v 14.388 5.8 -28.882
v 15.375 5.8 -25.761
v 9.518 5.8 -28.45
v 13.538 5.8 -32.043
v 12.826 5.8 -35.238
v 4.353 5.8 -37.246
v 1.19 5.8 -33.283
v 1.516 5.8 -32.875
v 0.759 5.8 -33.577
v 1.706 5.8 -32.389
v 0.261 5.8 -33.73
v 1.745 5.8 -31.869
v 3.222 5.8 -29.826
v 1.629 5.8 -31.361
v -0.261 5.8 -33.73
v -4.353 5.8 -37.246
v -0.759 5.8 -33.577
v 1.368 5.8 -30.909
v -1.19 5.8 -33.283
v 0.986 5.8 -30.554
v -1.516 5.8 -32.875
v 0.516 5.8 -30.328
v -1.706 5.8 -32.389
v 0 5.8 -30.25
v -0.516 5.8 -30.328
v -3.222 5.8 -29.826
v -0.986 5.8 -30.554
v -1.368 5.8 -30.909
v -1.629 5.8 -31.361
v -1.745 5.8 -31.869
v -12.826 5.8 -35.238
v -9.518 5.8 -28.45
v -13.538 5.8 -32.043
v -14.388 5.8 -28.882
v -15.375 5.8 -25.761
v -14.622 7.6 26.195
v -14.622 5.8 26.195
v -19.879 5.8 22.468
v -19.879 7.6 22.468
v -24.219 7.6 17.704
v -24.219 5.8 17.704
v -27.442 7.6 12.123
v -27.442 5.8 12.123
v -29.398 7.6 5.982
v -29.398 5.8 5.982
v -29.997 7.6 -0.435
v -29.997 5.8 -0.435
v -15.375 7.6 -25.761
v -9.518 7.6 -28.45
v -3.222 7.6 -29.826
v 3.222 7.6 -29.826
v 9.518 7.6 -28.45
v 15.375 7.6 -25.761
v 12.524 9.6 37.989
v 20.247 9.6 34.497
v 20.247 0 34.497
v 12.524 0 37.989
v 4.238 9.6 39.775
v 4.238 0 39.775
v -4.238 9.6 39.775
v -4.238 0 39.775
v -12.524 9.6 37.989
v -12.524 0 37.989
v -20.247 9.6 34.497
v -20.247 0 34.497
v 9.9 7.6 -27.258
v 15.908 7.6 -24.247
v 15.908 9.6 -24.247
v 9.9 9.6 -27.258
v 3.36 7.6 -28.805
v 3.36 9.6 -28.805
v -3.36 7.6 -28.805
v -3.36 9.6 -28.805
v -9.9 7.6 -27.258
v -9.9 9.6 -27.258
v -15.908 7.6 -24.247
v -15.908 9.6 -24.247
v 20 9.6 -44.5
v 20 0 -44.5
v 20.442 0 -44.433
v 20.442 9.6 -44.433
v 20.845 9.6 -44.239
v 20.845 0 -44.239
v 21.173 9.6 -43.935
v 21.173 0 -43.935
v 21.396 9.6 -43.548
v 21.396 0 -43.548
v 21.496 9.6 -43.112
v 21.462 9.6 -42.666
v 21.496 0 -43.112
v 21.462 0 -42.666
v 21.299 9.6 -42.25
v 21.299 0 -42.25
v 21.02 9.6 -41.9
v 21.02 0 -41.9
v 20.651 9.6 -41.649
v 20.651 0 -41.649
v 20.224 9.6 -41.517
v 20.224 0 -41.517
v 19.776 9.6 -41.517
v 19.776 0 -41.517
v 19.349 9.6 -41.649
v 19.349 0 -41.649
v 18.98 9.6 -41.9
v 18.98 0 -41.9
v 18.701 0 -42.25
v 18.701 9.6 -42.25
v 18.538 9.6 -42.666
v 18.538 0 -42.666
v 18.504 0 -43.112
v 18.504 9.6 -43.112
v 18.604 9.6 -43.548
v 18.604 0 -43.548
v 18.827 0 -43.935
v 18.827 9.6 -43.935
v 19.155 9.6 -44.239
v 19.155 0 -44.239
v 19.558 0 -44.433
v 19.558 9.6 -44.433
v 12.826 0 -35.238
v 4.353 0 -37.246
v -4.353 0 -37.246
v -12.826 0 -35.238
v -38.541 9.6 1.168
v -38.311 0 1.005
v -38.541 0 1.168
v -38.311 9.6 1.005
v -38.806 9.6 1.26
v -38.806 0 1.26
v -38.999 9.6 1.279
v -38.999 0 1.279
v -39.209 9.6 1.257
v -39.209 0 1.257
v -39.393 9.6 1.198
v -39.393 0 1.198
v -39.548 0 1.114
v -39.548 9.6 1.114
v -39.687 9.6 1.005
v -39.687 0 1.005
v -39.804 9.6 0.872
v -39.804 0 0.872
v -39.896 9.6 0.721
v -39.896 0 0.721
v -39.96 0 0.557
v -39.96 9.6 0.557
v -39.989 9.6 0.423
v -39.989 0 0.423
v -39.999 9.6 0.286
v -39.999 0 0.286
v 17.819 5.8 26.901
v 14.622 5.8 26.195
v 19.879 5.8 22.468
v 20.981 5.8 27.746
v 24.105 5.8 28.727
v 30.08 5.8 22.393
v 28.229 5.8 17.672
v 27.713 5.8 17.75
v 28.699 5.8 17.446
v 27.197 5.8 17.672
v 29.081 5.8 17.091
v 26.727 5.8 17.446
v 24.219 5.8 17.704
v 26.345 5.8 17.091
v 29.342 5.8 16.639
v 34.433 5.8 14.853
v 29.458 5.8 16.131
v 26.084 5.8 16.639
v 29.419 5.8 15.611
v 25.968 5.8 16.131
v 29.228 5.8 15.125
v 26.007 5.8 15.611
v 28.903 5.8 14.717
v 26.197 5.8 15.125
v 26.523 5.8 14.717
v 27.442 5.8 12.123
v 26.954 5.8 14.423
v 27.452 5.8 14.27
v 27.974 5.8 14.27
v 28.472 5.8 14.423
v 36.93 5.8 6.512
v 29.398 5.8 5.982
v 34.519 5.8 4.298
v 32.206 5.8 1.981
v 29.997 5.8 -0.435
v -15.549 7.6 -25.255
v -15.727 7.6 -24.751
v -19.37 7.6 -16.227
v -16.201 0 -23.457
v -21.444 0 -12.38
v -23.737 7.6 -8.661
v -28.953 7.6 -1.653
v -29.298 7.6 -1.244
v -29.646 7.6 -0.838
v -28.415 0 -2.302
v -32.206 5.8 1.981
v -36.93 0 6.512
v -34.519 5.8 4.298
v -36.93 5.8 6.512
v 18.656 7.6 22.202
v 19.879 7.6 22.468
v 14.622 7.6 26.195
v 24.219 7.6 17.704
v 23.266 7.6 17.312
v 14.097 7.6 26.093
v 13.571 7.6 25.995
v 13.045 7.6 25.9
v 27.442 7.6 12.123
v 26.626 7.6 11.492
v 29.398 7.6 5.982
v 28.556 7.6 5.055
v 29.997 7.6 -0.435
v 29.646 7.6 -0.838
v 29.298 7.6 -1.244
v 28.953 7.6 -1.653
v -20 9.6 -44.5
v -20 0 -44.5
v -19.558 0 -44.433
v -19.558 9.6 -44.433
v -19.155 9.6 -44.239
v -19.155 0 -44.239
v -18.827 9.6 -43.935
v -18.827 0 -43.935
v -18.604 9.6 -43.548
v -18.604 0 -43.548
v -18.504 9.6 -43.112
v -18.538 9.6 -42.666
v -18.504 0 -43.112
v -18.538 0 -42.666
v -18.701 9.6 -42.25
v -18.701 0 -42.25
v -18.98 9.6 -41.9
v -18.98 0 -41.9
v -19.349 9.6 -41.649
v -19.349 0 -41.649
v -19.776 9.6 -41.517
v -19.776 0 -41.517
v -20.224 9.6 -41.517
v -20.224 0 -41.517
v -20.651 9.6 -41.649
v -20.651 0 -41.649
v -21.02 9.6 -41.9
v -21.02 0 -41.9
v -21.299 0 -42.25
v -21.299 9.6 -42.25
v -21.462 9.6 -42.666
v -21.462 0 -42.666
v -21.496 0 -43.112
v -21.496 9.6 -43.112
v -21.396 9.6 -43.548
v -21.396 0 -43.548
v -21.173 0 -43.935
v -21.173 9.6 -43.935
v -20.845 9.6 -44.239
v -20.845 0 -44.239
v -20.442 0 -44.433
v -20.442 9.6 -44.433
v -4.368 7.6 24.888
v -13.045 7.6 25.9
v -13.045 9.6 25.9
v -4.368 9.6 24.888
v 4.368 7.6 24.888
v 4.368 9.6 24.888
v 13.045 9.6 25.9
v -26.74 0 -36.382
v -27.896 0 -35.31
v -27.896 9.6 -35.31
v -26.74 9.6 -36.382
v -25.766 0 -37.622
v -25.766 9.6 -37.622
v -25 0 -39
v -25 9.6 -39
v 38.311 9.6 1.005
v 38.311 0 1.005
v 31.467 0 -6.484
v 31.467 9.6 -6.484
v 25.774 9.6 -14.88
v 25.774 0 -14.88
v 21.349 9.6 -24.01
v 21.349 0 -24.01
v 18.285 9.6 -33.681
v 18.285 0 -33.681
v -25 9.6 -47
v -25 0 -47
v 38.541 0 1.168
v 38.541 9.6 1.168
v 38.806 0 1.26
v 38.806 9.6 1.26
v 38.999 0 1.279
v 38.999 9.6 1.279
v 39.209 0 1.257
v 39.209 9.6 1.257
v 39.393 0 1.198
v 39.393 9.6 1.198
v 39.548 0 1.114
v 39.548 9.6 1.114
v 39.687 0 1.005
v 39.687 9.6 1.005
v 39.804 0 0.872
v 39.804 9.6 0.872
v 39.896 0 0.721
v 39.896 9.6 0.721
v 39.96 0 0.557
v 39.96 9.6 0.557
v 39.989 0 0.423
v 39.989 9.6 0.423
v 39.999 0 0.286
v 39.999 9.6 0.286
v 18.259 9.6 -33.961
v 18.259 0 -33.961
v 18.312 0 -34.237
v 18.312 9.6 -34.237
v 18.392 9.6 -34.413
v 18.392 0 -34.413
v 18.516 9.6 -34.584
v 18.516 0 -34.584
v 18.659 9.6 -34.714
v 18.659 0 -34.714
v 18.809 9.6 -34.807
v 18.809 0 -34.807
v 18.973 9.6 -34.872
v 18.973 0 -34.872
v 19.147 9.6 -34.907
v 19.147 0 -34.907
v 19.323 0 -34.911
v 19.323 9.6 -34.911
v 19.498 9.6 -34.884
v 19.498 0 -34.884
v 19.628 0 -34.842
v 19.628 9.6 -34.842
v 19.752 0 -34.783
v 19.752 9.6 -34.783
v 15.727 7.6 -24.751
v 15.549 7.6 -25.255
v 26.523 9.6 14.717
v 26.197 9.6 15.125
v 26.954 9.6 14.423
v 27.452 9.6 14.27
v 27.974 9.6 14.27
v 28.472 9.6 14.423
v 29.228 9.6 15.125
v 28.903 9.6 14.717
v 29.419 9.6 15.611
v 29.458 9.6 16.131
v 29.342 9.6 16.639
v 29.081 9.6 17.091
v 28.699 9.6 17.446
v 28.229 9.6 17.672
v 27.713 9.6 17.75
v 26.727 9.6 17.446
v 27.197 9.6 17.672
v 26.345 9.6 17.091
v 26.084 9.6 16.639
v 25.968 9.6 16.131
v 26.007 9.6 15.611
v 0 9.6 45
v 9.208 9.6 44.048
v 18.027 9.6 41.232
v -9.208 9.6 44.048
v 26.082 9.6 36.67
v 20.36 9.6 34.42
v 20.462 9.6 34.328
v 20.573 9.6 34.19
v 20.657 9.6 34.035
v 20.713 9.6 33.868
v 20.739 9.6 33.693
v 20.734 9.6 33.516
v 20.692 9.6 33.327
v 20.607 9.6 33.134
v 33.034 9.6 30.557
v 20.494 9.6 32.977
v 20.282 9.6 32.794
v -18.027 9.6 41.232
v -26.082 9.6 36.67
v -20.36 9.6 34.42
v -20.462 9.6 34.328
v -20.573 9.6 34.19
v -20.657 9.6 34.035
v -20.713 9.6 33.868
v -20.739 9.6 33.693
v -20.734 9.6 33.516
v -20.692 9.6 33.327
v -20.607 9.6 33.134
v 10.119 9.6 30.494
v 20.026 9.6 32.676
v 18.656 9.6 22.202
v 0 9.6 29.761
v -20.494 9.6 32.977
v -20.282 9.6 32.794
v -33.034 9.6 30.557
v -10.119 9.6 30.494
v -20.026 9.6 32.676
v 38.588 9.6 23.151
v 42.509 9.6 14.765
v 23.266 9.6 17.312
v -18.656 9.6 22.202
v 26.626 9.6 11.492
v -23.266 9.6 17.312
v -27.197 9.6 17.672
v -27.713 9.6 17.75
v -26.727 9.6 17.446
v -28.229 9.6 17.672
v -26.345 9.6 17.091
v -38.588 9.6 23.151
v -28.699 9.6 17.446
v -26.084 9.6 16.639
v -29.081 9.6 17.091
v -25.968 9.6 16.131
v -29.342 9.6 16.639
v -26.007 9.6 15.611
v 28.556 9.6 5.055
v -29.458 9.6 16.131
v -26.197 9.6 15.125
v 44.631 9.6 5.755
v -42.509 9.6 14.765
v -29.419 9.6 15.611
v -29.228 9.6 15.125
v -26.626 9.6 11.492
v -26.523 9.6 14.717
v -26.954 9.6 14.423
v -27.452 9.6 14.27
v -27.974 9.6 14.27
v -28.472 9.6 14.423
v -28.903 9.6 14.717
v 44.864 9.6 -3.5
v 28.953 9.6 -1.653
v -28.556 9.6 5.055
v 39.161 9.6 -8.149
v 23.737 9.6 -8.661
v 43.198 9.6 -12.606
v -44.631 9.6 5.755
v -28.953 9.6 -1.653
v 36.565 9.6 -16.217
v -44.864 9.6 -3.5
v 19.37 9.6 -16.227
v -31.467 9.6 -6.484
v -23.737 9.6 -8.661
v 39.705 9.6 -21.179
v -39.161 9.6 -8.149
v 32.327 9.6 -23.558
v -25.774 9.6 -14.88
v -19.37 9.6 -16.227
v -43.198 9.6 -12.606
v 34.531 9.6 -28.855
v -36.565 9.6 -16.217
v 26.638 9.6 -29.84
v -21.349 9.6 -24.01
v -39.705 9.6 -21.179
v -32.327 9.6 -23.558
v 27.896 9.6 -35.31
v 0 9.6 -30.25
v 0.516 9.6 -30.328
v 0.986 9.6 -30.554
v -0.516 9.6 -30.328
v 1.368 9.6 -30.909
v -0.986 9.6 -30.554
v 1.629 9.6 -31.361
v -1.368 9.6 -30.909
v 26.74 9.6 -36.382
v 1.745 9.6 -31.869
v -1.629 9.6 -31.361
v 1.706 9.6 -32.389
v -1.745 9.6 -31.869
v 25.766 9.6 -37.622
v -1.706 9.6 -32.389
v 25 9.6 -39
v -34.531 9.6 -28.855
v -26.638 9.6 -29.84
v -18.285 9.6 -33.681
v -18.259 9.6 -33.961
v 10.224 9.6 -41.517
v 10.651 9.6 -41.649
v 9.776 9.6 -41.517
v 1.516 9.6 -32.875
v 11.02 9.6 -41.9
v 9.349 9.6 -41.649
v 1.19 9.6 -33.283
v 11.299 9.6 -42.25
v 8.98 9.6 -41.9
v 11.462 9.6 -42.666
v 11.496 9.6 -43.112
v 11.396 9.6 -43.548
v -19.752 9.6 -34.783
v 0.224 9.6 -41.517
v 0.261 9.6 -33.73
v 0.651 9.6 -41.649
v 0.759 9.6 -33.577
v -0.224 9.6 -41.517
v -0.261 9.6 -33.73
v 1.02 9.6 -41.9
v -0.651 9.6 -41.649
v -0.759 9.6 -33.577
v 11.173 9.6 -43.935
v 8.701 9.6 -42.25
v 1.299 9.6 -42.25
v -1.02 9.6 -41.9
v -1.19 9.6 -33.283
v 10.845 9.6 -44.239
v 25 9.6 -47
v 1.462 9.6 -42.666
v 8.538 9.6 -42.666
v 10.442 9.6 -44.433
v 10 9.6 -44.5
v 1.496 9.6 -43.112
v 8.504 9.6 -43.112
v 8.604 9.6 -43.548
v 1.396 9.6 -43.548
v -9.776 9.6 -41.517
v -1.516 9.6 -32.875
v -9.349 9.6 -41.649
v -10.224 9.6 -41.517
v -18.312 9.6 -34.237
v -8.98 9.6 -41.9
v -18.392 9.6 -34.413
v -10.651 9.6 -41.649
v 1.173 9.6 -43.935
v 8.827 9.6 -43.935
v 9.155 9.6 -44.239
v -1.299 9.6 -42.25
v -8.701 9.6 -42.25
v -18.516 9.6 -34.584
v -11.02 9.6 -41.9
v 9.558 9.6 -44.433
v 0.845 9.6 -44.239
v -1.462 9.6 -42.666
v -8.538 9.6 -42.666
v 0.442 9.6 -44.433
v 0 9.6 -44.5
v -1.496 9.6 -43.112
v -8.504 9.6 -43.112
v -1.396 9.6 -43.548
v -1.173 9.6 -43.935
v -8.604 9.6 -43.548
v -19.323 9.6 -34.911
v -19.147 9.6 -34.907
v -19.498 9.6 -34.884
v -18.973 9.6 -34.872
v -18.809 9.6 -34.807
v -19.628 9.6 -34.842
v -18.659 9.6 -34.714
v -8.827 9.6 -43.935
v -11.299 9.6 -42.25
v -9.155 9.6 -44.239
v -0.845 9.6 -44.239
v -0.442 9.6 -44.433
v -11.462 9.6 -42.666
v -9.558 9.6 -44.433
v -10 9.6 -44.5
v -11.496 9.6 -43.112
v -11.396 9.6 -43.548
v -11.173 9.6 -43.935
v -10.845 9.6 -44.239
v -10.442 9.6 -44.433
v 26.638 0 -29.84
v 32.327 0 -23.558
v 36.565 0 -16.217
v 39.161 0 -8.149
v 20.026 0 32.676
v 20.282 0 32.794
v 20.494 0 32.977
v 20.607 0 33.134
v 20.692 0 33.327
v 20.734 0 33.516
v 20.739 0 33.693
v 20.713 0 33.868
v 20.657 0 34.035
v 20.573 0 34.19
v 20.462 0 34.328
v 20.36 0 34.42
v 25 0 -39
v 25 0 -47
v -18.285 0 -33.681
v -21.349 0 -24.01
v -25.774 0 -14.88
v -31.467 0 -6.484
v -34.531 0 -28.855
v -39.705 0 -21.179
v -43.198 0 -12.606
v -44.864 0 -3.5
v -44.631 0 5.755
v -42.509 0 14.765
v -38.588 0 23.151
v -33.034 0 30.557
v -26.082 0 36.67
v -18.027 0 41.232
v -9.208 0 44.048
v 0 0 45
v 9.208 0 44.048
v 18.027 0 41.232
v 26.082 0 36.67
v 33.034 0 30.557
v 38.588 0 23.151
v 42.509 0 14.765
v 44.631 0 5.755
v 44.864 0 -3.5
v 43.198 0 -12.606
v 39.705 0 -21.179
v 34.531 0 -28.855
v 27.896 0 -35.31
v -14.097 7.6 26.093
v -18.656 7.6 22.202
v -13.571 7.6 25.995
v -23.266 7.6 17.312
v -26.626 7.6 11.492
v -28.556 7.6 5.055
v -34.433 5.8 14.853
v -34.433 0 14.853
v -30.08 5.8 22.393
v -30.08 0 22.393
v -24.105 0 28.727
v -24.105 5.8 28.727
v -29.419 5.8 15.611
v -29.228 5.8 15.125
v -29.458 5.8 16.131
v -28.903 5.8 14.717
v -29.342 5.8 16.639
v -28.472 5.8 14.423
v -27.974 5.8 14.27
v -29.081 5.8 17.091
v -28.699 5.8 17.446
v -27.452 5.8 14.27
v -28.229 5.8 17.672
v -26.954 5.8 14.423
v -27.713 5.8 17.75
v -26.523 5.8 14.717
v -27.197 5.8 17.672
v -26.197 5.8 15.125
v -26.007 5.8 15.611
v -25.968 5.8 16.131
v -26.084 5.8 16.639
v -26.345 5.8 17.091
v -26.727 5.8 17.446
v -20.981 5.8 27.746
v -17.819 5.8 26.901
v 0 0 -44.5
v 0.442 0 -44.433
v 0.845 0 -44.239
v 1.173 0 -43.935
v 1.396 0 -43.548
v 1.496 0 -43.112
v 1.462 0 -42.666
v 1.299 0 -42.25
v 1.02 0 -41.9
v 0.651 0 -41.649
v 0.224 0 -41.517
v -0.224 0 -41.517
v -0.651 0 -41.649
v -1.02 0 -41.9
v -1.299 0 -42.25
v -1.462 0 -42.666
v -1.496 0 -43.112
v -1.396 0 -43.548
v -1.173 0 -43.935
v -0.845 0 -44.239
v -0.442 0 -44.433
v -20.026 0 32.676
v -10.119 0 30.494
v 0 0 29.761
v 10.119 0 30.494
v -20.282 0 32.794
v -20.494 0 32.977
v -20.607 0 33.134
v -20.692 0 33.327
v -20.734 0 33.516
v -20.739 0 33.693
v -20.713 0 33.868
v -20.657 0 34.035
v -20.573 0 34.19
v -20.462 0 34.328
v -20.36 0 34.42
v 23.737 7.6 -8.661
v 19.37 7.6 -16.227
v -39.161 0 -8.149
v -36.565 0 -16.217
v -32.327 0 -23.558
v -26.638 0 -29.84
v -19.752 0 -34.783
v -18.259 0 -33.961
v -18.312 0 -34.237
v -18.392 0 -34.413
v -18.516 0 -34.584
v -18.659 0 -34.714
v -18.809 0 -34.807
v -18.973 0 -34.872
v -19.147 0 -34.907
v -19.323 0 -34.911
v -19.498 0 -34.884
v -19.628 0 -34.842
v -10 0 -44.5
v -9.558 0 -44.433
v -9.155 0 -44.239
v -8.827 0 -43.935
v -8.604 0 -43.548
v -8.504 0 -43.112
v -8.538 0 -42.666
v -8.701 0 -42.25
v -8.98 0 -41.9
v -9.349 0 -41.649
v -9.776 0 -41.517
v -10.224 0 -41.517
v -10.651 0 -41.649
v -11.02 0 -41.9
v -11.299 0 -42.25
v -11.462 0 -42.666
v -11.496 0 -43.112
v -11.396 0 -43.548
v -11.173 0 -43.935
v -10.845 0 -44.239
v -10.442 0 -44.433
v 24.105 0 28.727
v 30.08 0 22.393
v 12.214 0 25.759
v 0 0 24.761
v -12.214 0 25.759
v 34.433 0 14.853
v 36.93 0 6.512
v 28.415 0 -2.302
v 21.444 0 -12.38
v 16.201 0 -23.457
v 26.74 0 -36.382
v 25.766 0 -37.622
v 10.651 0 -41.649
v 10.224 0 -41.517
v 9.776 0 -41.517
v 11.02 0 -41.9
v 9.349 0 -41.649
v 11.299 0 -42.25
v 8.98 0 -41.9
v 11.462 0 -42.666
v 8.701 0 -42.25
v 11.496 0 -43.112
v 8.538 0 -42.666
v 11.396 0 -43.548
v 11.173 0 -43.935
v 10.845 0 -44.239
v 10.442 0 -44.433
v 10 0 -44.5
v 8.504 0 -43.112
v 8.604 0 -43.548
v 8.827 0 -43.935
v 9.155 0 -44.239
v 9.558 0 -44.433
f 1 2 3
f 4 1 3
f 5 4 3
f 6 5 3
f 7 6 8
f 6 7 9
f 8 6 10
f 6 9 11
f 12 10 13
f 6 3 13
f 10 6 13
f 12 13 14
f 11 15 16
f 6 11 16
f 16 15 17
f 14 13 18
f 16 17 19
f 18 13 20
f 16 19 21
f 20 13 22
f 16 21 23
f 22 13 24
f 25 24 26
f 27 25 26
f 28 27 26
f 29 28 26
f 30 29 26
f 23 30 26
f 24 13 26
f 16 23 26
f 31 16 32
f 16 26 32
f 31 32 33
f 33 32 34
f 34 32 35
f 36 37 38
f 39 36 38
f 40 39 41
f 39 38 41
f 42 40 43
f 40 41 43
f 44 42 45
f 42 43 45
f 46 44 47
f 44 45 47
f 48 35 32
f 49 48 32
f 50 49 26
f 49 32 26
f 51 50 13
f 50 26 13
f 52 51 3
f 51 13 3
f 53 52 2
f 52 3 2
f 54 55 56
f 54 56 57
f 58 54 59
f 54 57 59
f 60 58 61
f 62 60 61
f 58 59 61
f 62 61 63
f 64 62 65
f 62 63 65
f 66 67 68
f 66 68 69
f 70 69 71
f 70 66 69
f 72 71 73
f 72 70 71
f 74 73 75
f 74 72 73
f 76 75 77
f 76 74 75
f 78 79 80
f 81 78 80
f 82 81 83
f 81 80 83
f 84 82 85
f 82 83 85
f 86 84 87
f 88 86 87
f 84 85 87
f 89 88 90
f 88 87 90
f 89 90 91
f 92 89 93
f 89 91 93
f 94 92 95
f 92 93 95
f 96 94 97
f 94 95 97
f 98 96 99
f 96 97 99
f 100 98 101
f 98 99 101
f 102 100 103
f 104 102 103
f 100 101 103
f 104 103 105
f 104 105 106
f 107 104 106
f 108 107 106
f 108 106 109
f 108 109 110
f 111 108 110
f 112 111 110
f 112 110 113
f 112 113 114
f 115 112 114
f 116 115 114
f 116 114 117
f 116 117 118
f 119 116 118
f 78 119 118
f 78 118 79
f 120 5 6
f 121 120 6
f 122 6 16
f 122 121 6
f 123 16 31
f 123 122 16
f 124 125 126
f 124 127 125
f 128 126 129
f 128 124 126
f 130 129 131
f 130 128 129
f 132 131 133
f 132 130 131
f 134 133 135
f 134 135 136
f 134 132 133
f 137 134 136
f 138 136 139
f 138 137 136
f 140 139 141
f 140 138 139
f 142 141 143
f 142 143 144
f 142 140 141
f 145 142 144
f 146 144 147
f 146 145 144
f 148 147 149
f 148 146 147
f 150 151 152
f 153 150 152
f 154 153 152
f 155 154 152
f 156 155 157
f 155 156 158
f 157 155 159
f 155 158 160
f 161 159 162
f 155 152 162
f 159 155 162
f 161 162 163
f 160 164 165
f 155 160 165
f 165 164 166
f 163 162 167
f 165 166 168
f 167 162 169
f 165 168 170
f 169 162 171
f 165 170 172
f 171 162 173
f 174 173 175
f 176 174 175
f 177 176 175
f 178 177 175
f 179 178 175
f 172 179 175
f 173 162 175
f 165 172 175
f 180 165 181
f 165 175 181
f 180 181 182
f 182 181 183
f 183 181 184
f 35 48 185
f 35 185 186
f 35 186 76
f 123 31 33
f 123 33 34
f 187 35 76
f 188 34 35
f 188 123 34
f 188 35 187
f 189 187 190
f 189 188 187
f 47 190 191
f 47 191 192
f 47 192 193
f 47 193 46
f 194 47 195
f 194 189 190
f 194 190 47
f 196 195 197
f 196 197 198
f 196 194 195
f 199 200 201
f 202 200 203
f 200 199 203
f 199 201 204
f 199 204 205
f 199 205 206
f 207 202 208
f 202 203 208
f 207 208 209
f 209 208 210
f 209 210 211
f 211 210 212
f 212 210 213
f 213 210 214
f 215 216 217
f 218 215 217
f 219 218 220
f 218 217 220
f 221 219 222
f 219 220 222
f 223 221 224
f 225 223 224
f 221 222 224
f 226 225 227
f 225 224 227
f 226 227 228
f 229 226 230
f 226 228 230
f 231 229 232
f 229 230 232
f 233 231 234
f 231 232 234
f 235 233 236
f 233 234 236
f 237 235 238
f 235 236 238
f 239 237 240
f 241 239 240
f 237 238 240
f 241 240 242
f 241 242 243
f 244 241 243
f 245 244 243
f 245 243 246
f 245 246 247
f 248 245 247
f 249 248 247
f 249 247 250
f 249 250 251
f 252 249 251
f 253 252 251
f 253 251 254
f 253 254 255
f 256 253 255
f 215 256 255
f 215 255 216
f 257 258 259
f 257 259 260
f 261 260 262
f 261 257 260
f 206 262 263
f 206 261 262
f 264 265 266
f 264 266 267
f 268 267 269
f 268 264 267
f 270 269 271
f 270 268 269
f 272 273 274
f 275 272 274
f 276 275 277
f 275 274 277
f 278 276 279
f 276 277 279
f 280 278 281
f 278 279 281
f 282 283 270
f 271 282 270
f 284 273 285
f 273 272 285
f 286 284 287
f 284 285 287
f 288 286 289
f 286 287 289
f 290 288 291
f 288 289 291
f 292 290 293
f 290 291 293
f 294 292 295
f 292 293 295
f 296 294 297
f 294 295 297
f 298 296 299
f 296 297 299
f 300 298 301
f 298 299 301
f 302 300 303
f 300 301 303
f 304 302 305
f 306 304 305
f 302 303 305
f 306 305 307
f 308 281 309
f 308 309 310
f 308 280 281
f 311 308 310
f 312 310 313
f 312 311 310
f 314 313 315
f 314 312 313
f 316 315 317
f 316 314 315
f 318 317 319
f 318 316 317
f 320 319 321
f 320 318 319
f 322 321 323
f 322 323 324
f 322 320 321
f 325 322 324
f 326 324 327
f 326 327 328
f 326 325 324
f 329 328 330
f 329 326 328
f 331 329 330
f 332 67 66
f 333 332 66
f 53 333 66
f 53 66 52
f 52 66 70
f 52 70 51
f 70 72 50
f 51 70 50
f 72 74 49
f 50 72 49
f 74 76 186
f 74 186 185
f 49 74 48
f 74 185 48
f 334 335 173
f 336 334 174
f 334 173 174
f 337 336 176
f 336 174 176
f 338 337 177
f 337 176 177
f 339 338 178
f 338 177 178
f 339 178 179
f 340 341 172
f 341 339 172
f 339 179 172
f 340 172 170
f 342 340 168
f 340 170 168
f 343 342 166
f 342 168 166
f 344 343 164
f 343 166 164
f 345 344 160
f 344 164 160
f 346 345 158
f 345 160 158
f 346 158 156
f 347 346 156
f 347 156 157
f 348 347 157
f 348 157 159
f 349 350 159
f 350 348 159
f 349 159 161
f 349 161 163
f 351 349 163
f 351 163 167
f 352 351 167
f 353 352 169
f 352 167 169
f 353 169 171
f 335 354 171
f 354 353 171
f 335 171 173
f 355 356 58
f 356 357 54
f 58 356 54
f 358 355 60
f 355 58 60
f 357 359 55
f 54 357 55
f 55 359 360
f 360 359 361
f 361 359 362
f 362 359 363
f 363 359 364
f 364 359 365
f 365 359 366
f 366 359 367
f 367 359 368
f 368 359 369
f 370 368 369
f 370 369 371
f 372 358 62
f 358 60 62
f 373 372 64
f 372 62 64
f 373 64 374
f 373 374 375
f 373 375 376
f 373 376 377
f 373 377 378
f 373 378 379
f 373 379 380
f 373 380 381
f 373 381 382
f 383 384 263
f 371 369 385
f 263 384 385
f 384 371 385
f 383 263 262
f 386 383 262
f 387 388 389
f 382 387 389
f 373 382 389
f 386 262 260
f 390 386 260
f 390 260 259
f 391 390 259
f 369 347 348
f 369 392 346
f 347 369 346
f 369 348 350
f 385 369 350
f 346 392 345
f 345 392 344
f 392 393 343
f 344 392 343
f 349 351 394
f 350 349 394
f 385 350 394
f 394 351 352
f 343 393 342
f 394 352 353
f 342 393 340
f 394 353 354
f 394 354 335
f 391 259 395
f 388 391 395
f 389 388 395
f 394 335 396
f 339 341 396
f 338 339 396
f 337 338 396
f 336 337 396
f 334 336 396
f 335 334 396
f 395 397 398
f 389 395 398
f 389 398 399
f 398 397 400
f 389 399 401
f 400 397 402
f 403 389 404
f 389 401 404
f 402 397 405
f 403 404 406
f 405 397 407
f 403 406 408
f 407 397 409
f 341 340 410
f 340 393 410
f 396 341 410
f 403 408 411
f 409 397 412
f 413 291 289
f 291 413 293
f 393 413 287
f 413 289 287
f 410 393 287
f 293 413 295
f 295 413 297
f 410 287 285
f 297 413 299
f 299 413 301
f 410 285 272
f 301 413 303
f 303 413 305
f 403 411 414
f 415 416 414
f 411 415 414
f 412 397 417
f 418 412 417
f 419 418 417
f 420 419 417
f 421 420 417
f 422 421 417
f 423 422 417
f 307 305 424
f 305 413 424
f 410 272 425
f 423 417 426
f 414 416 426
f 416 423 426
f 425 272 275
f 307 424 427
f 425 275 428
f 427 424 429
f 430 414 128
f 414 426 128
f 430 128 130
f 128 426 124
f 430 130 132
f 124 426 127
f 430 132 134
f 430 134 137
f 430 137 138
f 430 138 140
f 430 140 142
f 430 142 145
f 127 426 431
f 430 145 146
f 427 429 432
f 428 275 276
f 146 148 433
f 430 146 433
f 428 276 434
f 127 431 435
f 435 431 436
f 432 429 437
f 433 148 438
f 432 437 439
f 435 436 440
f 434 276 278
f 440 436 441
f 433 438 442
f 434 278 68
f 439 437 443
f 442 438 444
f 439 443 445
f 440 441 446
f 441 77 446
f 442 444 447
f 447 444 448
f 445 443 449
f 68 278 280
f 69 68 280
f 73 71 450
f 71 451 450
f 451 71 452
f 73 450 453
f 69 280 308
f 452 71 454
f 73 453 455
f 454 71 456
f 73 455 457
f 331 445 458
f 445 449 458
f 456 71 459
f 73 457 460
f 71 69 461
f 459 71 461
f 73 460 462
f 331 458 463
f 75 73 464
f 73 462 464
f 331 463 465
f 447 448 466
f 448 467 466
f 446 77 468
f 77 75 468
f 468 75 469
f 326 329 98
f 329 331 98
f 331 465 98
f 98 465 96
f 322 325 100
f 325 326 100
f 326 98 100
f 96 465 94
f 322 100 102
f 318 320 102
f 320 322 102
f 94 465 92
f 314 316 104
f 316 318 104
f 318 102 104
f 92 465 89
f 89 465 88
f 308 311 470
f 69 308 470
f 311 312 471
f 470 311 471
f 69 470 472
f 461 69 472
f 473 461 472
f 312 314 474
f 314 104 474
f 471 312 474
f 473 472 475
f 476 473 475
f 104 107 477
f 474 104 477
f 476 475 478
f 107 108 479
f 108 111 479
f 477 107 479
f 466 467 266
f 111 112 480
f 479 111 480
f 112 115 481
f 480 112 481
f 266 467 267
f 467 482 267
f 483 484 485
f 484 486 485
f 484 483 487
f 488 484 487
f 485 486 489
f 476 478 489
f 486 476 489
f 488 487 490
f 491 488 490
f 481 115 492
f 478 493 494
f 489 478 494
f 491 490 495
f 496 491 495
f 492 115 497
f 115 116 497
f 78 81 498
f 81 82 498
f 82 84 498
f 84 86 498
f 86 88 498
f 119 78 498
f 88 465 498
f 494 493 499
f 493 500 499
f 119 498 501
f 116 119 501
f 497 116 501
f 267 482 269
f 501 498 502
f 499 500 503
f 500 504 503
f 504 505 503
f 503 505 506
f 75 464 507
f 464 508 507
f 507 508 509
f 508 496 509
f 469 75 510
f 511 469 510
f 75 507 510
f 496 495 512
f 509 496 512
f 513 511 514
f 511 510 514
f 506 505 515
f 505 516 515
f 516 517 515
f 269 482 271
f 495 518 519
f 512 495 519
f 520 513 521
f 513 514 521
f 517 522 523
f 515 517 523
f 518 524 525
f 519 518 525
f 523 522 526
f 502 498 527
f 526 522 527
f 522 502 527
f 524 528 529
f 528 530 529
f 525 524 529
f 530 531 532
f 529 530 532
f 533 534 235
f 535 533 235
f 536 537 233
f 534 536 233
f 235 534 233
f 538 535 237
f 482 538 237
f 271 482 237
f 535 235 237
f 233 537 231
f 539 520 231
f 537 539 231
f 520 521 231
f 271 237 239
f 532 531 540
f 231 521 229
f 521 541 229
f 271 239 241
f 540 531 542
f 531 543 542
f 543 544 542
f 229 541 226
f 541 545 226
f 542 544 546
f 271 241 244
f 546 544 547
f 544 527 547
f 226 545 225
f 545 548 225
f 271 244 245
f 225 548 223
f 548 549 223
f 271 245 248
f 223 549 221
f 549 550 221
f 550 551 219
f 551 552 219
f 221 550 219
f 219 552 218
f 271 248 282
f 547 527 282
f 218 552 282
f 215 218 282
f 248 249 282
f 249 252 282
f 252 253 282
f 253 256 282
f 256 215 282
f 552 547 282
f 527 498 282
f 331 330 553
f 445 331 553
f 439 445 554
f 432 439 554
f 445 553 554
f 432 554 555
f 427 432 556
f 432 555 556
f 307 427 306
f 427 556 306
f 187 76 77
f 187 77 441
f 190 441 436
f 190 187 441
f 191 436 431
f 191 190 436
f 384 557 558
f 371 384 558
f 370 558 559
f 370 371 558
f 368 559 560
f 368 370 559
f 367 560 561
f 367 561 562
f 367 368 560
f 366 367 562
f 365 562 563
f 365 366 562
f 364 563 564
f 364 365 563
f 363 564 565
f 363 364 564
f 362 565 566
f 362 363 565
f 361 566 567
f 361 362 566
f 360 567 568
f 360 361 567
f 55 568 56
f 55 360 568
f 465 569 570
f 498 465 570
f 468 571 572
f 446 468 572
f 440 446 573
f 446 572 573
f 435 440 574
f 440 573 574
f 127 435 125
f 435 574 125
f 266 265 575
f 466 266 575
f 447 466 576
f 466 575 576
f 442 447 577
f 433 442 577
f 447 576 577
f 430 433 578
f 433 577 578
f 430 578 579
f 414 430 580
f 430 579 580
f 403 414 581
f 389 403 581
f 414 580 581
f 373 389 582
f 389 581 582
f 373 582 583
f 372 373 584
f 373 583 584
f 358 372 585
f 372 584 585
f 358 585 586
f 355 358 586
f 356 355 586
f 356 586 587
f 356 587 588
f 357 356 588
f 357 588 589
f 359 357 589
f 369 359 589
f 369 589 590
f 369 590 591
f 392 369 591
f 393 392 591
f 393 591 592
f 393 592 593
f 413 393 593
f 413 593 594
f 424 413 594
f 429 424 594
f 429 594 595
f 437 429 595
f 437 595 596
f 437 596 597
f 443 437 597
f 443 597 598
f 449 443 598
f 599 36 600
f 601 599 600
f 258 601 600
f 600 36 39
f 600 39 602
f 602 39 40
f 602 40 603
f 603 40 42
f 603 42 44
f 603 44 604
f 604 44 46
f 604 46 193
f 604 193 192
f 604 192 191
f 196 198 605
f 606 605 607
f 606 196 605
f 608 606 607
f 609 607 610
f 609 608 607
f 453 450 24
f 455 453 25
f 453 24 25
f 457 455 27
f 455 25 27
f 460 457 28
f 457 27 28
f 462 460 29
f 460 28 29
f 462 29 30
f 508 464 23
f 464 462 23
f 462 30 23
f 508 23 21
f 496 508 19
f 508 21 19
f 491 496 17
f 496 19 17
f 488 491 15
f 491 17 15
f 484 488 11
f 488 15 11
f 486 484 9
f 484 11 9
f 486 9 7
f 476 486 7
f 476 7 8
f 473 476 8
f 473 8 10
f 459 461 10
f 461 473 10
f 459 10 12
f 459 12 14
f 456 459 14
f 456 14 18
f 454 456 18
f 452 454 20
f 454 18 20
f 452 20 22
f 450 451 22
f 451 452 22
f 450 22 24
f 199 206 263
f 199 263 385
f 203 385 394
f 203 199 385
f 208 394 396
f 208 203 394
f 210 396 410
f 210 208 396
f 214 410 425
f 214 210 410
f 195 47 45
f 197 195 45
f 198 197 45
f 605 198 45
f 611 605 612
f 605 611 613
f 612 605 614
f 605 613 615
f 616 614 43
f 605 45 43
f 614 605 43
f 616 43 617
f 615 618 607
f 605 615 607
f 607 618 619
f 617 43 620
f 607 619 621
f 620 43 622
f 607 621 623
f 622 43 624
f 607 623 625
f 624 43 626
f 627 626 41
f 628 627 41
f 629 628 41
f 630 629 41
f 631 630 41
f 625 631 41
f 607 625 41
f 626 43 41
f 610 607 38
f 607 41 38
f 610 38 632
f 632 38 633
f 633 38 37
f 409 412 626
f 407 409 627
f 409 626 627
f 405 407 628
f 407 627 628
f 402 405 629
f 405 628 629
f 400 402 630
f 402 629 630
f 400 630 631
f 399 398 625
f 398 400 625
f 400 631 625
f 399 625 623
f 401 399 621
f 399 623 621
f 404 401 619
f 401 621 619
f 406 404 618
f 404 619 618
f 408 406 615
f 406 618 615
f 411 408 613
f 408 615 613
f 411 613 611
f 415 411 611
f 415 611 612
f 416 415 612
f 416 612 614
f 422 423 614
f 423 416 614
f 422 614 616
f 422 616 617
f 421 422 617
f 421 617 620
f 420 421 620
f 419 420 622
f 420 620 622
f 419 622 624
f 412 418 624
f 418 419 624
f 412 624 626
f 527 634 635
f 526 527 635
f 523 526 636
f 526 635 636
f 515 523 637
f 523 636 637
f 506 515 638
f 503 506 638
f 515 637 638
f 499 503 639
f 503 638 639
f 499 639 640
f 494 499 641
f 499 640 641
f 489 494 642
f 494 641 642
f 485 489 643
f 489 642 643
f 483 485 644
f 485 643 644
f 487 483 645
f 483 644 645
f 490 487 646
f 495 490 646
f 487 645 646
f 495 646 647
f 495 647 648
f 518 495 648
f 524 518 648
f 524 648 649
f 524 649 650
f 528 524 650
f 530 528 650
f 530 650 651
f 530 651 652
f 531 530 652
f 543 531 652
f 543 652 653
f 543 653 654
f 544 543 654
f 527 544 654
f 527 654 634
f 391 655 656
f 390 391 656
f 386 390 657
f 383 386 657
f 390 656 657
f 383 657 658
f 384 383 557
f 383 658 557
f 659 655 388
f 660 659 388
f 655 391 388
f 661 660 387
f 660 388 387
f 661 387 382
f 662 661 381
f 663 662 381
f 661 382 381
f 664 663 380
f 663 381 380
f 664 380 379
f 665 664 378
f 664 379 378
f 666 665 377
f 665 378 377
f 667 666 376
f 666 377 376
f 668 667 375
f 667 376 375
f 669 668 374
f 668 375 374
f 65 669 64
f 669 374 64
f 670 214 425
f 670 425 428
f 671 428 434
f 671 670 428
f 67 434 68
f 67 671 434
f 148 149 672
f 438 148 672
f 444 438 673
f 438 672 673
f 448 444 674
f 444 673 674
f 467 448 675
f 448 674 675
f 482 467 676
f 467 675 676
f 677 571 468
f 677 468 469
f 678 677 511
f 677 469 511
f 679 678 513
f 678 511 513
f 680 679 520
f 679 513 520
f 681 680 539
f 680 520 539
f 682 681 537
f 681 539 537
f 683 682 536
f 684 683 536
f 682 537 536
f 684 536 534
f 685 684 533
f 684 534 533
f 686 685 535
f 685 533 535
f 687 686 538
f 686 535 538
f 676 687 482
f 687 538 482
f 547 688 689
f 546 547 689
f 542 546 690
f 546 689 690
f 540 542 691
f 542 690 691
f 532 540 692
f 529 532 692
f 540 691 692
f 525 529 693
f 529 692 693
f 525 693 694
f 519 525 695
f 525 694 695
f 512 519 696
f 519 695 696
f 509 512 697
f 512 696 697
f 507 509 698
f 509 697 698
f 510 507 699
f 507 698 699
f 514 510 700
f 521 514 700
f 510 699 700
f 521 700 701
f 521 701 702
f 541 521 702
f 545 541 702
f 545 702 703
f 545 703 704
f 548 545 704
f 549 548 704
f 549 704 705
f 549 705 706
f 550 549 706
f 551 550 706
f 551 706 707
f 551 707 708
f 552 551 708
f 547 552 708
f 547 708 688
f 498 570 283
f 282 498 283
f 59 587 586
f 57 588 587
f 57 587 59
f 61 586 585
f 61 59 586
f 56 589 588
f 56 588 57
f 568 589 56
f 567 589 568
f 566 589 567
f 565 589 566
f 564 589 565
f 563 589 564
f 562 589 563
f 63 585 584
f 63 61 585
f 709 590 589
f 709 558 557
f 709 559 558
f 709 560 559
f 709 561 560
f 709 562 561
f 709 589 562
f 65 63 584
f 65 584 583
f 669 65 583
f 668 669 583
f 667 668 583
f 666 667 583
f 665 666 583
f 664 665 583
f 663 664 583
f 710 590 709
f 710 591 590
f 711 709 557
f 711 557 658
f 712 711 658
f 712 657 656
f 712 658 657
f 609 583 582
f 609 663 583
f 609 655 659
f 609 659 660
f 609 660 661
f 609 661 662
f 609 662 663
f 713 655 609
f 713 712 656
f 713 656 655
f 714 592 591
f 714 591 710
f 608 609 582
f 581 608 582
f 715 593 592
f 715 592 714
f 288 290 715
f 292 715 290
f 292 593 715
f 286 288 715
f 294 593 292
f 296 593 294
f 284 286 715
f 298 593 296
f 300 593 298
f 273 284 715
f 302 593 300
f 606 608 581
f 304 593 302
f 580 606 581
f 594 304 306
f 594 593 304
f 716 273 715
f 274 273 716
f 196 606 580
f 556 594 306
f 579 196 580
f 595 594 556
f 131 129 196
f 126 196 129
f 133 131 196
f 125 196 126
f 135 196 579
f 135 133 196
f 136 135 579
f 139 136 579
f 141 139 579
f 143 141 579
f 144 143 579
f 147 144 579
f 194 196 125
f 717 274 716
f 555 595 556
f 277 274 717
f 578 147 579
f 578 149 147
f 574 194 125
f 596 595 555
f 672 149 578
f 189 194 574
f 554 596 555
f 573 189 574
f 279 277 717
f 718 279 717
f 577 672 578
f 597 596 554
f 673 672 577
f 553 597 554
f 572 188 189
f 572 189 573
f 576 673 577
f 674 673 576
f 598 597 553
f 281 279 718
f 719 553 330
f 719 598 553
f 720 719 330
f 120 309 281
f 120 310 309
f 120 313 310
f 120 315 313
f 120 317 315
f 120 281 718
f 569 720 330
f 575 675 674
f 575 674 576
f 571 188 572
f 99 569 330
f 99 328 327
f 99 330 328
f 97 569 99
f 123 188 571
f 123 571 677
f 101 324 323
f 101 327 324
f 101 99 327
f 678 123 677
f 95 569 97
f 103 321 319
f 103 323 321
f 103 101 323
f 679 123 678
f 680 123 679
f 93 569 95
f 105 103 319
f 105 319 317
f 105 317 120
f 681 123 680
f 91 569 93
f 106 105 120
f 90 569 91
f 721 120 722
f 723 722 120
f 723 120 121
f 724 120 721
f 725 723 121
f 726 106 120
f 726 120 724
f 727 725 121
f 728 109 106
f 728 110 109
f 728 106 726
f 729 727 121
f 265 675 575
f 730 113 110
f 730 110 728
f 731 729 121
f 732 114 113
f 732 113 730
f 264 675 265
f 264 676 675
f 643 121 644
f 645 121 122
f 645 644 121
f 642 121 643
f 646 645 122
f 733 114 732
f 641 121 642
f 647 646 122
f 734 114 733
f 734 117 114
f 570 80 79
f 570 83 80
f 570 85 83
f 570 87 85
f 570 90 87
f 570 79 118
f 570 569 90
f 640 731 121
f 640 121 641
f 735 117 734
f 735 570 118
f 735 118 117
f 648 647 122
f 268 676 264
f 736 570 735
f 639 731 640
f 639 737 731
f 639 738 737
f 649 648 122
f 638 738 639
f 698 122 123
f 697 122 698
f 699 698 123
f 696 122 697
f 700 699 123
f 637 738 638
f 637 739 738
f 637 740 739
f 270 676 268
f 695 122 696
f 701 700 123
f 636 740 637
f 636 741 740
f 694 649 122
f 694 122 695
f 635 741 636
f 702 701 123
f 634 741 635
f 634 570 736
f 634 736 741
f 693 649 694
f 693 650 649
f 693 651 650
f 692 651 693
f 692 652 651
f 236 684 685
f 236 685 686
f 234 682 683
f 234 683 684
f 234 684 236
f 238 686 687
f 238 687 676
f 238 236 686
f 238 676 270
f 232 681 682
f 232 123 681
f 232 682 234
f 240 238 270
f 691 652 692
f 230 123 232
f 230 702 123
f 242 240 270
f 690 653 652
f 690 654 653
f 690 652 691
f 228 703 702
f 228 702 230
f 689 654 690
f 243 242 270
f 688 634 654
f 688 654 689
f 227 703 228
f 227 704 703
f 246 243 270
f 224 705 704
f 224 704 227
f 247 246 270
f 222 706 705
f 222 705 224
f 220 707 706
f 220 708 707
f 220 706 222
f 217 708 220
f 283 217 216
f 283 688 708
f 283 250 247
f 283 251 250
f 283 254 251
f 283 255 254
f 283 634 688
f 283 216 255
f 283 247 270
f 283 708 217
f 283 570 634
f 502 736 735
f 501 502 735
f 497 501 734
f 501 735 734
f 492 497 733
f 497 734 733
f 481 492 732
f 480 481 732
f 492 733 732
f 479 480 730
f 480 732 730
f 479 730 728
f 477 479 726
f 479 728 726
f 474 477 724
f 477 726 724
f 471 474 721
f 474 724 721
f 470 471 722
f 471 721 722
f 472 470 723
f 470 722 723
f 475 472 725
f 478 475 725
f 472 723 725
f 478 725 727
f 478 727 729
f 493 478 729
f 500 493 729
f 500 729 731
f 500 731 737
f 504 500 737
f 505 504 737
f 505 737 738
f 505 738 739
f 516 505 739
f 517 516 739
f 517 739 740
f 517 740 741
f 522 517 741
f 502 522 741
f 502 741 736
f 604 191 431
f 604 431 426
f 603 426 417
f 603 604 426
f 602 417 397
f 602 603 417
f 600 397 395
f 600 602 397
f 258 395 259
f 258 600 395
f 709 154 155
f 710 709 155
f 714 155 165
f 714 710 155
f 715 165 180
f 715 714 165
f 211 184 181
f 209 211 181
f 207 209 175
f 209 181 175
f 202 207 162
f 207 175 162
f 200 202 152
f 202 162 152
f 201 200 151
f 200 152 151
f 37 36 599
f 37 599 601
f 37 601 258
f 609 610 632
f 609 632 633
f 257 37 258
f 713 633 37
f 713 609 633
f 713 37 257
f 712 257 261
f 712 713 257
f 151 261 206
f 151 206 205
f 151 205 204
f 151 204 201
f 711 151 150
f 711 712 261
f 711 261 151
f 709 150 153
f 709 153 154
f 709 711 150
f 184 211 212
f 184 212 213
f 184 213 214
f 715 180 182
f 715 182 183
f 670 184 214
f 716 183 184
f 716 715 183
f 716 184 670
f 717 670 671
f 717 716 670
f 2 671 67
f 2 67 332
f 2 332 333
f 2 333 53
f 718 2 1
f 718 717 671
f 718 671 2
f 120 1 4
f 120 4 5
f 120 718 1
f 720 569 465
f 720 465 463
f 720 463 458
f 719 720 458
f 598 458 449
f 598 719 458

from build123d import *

# Parameters (mm, degrees)
SKETCH1_R                = 37.5
BOSS_EXTRUDE1_DEPTH      = 7.6
CUT_EXTRUDE2_START       = -7.6
CUT_EXTRUDE2_DEPTH       = 7.6
SKETCH4_R                = 45
SKETCH4_R_2              = 37.5
BOSS_EXTRUDE2_DEPTH      = 7.6
SKETCH6_R                = 45
BOSS_EXTRUDE3_DEPTH      = 2
SKETCH7_R                = 1.75
CUT_EXTRUDE3_DEPTH       = 65.359614666
CIRPATTERN2_COUNT        = 3
BOSS_EXTRUDE4_START      = -9.6
BOSS_EXTRUDE4_DEPTH      = 9.6
FILLET1_R                = 10
SKETCH12_R               = 1.5
CUT_EXTRUDE6_DEPTH       = 66.773550915
LPATTERN1_COUNT          = 10
LPATTERN1_PITCH          = 10
CUT_EXTRUDE7_DEPTH       = 66.773550915
FILLET3_R                = 1
CIRPATTERN3_COUNT        = 3
FILLET3_OF_CIRPATTERN3_R = 1
BOSS_EXTRUDE5_START      = 1.8
SKETCH14_R               = 1.75
BOSS_EXTRUDE5_DEPTH      = 1.8
CIRPATTERN4_COUNT        = 3


# Read off the part's stored shape, not the designer's step: Cut-Extrude2
with BuildPart() as part:
    # Sketch1 → Boss-Extrude1 (new body)
    with BuildSketch(Plane(origin=(0, 0, 0), x_dir=(1, 0, 0), z_dir=(0, 1, 0))):
        with Locations(Location((0, 0, 0), (0, 0, 90))):
            Circle(SKETCH1_R)
    extrude(amount=BOSS_EXTRUDE1_DEPTH)

    # Cut-Extrude2 outline → Cut-Extrude2 (cut)
    with BuildSketch(Plane(origin=(0, 7.6, 0), x_dir=(1, 0, 0), z_dir=(0, 1, 0)).offset(CUT_EXTRUDE2_START)):
        with BuildLine():
            ThreePointArc((-24.104535363, -28.726666617), (0, -24.760936498), (24.104535363, -28.726666617))
            ThreePointArc((24.104535363, -28.726666617), (32.475952642, -18.75), (36.930290738, -6.511806663))
            ThreePointArc((36.930290738, -6.511806663), (21.443600029, 12.380468249), (12.825755375, 35.238473279))
            ThreePointArc((12.825755375, 35.238473279), (0, 37.5), (-12.825755375, 35.238473279))
            ThreePointArc((-12.825755375, 35.238473279), (-21.443600029, 12.380468249), (-36.930290738, -6.511806663))
            ThreePointArc((-36.930290738, -6.511806663), (-32.475952642, -18.75), (-24.104535363, -28.726666617))
        make_face()
    extrude(amount=CUT_EXTRUDE2_DEPTH, mode=Mode.SUBTRACT)

    # Sketch4 → Boss-Extrude2 (add)
    with BuildSketch(Plane(origin=(0, 0, 0), x_dir=(1, 0, 0), z_dir=(0, 1, 0))):
        with Locations(Location((0, 0, 0), (0, 0, 90))):
            Circle(SKETCH4_R)
        Circle(SKETCH4_R_2, mode=Mode.SUBTRACT)
    extrude(amount=BOSS_EXTRUDE2_DEPTH)

    # Sketch6 → Boss-Extrude3 (add)
    with BuildSketch(Plane(origin=(0, 7.6, 0), x_dir=(1, 0, 0), z_dir=(0, 1, 0))):
        with Locations(Location((0, 0, 0), (0, 0, 90))):
            Circle(SKETCH6_R)
        with BuildLine():
            ThreePointArc((-28.952849653, 1.653026611), (-25.11473671, -14.5), (-13.044861788, -25.900416617))
            ThreePointArc((-13.044861788, -25.900416617), (0, -24.760936498), (13.044861788, -25.900416617))
            ThreePointArc((13.044861788, -25.900416617), (25.11473671, -14.5), (28.952849653, 1.653026611))
            ThreePointArc((28.952849653, 1.653026611), (21.443600029, 12.380468249), (15.907987865, 24.247390006))
            ThreePointArc((15.907987865, 24.247390006), (0, 29), (-15.907987865, 24.247390006))
            ThreePointArc((-15.907987865, 24.247390006), (-21.443600029, 12.380468249), (-28.952849653, 1.653026611))
        make_face(mode=Mode.SUBTRACT)
    extrude(amount=BOSS_EXTRUDE3_DEPTH)

    # Sketch7 → Cut-Extrude3 (cut, through all)
    with BuildSketch(Plane(origin=(0, 9.6, 0), x_dir=(1, 0, 0), z_dir=(0, 1, 0))):
        with Locations(Location((0, 32, 0), (0, 0, 270))):
            Circle(SKETCH7_R)
    cut_extrude3 = extrude(amount=-CUT_EXTRUDE3_DEPTH, mode=Mode.SUBTRACT)

    # CirPattern2: Cut-Extrude3 ×3 about axis
    cirpattern2_axis = Axis((0, 0, 0), (0, 1, 0))
    for i in range(1, CIRPATTERN2_COUNT):
        add(cut_extrude3.rotate(cirpattern2_axis, i * 360 / CIRPATTERN2_COUNT), mode=Mode.SUBTRACT)

    # Sketch11 → Boss-Extrude4 (add)
    with BuildSketch(Plane(origin=(0, 9.6, 0), x_dir=(1, 0, 0), z_dir=(0, 1, 0)).offset(BOSS_EXTRUDE4_START)):
        with BuildLine():
            ThreePointArc((-22.449944321, 39), (0, 45), (22.449944321, 39))
            Line((22.449944321, 39), (25, 39))
            Line((25, 39), (25, 47))
            Line((25, 47), (-25, 47))
            Line((-25, 47), (-25, 39))
            Line((-25, 39), (-22.449944321, 39))
        make_face()
    extrude(amount=BOSS_EXTRUDE4_DEPTH)

    # Fillet1
    # the kernel refuses this fillet: 10 mm, written as the material it adds along each edge
    with BuildSketch(Plane(origin=(-22.449944321, 0, -39), x_dir=(-0.8278845523725272, 0, 0.5608985362282026), z_dir=(0, 1, 0))) as fillet1_piece_1:
        with BuildLine():
            CenterArc((7.309068463, -9.973252989), FILLET1_R, 94.191525444, 27.126753117)
            Line((2.111151705, -1.430322498), (0, 0))
            ThreePointArc((0, 0), (3.289080808, -0.12036155), (6.578161616, 0))
        make_face()
    extrude(amount=9.6)
    with BuildSketch(Plane(origin=(22.449944321, 0, -39), x_dir=(0.8278845523725283, 0, 0.560898536228201), z_dir=(0, 1, 0))) as fillet1_piece_2:
        with BuildLine():
            CenterArc((7.309068463, 9.973252989), FILLET1_R, 238.681721439, 27.126753117)
            Line((2.111151705, 1.430322498), (0, 0))
            ThreePointArc((0, 0), (3.289080808, 0.12036155), (6.578161616, 0))
        make_face()
    extrude(amount=9.6)

    # Sketch12 → Cut-Extrude6 (cut, through all)
    with BuildSketch(Plane.XZ):
        with Locations(Location((-20, -43, 0), (0, 0, 270))):
            Circle(SKETCH12_R)
    cut_extrude6 = extrude(amount=-CUT_EXTRUDE6_DEPTH, mode=Mode.SUBTRACT)

    # LPattern1: Cut-Extrude6 ×10
    with Locations(*[(i * LPATTERN1_PITCH, 0, 0) for i in range(1, LPATTERN1_COUNT)]):
        add(cut_extrude6, mode=Mode.SUBTRACT)

    # Sketch13 → Cut-Extrude7 (cut, through all)
    with BuildSketch(Plane.XZ):
        with BuildLine():
            ThreePointArc((-22.11228446, 33.332369792), (0, 29.760936498), (22.11228446, 33.332369792))
            ThreePointArc((22.11228446, 33.332369792), (0, 40), (-22.11228446, 33.332369792))
        make_face()
    cut_extrude7 = extrude(amount=-CUT_EXTRUDE7_DEPTH, mode=Mode.SUBTRACT)

    # Fillet3
    fillet3_edges = [part.edges().sort_by_distance(p)[0] for p in [
        (-22.11228446, 4.8, 33.332369792),
        (22.11228446, 4.8, 33.332369792),
    ]]
    fillet(fillet3_edges, radius=FILLET3_R)

    # CirPattern3: Cut-Extrude7 ×3 about axis
    cirpattern3_axis = Axis((0, 0, 0), (0, 1, 0))
    for i in range(1, CIRPATTERN3_COUNT):
        add(cut_extrude7.rotate(cirpattern3_axis, i * 360 / CIRPATTERN3_COUNT), mode=Mode.SUBTRACT)

    # Fillet3 of CirPattern3
    fillet3_of_cirpattern3_edges = [part.edges().sort_by_distance(p)[0] for p in [
        (39.922821238, 4.8, 2.483615182),
        (17.810536778, 4.8, -35.815984974),
        (-17.810536778, 4.8, -35.815984974),
        (-39.922821238, 4.8, 2.483615182),
    ]]
    fillet(fillet3_of_cirpattern3_edges, radius=FILLET3_OF_CIRPATTERN3_R)

    # Sketch14 → Boss-Extrude5 (add)
    with BuildSketch(Plane.XZ.offset(-7.6).offset(BOSS_EXTRUDE5_START)):
        with BuildLine():
            ThreePointArc((-15.374943027, -25.760650747), (0, -30), (15.374943027, -25.760650747))
            ThreePointArc((15.374943027, -25.760650747), (13.94564115, -30.457951205), (12.825755375, -35.238473279))
            ThreePointArc((12.825755375, -35.238473279), (0, -37.5), (-12.825755375, -35.238473279))
            ThreePointArc((-12.825755375, -35.238473279), (-13.94564115, -30.457951205), (-15.374943027, -25.760650747))
        make_face()
        with Locations(Location((0, -32, 0), (0, 0, 90))):
            Circle(SKETCH14_R, mode=Mode.SUBTRACT)
    boss_extrude5 = extrude(amount=-BOSS_EXTRUDE5_DEPTH)

    # CirPattern4: Boss-Extrude5 ×3 about axis
    cirpattern4_axis = Axis((0, 7.6, 0), (0, -1, 0))
    for i in range(1, CIRPATTERN4_COUNT):
        add(boss_extrude5.rotate(cirpattern4_axis, i * 360 / CIRPATTERN4_COUNT))


solid = part.part
